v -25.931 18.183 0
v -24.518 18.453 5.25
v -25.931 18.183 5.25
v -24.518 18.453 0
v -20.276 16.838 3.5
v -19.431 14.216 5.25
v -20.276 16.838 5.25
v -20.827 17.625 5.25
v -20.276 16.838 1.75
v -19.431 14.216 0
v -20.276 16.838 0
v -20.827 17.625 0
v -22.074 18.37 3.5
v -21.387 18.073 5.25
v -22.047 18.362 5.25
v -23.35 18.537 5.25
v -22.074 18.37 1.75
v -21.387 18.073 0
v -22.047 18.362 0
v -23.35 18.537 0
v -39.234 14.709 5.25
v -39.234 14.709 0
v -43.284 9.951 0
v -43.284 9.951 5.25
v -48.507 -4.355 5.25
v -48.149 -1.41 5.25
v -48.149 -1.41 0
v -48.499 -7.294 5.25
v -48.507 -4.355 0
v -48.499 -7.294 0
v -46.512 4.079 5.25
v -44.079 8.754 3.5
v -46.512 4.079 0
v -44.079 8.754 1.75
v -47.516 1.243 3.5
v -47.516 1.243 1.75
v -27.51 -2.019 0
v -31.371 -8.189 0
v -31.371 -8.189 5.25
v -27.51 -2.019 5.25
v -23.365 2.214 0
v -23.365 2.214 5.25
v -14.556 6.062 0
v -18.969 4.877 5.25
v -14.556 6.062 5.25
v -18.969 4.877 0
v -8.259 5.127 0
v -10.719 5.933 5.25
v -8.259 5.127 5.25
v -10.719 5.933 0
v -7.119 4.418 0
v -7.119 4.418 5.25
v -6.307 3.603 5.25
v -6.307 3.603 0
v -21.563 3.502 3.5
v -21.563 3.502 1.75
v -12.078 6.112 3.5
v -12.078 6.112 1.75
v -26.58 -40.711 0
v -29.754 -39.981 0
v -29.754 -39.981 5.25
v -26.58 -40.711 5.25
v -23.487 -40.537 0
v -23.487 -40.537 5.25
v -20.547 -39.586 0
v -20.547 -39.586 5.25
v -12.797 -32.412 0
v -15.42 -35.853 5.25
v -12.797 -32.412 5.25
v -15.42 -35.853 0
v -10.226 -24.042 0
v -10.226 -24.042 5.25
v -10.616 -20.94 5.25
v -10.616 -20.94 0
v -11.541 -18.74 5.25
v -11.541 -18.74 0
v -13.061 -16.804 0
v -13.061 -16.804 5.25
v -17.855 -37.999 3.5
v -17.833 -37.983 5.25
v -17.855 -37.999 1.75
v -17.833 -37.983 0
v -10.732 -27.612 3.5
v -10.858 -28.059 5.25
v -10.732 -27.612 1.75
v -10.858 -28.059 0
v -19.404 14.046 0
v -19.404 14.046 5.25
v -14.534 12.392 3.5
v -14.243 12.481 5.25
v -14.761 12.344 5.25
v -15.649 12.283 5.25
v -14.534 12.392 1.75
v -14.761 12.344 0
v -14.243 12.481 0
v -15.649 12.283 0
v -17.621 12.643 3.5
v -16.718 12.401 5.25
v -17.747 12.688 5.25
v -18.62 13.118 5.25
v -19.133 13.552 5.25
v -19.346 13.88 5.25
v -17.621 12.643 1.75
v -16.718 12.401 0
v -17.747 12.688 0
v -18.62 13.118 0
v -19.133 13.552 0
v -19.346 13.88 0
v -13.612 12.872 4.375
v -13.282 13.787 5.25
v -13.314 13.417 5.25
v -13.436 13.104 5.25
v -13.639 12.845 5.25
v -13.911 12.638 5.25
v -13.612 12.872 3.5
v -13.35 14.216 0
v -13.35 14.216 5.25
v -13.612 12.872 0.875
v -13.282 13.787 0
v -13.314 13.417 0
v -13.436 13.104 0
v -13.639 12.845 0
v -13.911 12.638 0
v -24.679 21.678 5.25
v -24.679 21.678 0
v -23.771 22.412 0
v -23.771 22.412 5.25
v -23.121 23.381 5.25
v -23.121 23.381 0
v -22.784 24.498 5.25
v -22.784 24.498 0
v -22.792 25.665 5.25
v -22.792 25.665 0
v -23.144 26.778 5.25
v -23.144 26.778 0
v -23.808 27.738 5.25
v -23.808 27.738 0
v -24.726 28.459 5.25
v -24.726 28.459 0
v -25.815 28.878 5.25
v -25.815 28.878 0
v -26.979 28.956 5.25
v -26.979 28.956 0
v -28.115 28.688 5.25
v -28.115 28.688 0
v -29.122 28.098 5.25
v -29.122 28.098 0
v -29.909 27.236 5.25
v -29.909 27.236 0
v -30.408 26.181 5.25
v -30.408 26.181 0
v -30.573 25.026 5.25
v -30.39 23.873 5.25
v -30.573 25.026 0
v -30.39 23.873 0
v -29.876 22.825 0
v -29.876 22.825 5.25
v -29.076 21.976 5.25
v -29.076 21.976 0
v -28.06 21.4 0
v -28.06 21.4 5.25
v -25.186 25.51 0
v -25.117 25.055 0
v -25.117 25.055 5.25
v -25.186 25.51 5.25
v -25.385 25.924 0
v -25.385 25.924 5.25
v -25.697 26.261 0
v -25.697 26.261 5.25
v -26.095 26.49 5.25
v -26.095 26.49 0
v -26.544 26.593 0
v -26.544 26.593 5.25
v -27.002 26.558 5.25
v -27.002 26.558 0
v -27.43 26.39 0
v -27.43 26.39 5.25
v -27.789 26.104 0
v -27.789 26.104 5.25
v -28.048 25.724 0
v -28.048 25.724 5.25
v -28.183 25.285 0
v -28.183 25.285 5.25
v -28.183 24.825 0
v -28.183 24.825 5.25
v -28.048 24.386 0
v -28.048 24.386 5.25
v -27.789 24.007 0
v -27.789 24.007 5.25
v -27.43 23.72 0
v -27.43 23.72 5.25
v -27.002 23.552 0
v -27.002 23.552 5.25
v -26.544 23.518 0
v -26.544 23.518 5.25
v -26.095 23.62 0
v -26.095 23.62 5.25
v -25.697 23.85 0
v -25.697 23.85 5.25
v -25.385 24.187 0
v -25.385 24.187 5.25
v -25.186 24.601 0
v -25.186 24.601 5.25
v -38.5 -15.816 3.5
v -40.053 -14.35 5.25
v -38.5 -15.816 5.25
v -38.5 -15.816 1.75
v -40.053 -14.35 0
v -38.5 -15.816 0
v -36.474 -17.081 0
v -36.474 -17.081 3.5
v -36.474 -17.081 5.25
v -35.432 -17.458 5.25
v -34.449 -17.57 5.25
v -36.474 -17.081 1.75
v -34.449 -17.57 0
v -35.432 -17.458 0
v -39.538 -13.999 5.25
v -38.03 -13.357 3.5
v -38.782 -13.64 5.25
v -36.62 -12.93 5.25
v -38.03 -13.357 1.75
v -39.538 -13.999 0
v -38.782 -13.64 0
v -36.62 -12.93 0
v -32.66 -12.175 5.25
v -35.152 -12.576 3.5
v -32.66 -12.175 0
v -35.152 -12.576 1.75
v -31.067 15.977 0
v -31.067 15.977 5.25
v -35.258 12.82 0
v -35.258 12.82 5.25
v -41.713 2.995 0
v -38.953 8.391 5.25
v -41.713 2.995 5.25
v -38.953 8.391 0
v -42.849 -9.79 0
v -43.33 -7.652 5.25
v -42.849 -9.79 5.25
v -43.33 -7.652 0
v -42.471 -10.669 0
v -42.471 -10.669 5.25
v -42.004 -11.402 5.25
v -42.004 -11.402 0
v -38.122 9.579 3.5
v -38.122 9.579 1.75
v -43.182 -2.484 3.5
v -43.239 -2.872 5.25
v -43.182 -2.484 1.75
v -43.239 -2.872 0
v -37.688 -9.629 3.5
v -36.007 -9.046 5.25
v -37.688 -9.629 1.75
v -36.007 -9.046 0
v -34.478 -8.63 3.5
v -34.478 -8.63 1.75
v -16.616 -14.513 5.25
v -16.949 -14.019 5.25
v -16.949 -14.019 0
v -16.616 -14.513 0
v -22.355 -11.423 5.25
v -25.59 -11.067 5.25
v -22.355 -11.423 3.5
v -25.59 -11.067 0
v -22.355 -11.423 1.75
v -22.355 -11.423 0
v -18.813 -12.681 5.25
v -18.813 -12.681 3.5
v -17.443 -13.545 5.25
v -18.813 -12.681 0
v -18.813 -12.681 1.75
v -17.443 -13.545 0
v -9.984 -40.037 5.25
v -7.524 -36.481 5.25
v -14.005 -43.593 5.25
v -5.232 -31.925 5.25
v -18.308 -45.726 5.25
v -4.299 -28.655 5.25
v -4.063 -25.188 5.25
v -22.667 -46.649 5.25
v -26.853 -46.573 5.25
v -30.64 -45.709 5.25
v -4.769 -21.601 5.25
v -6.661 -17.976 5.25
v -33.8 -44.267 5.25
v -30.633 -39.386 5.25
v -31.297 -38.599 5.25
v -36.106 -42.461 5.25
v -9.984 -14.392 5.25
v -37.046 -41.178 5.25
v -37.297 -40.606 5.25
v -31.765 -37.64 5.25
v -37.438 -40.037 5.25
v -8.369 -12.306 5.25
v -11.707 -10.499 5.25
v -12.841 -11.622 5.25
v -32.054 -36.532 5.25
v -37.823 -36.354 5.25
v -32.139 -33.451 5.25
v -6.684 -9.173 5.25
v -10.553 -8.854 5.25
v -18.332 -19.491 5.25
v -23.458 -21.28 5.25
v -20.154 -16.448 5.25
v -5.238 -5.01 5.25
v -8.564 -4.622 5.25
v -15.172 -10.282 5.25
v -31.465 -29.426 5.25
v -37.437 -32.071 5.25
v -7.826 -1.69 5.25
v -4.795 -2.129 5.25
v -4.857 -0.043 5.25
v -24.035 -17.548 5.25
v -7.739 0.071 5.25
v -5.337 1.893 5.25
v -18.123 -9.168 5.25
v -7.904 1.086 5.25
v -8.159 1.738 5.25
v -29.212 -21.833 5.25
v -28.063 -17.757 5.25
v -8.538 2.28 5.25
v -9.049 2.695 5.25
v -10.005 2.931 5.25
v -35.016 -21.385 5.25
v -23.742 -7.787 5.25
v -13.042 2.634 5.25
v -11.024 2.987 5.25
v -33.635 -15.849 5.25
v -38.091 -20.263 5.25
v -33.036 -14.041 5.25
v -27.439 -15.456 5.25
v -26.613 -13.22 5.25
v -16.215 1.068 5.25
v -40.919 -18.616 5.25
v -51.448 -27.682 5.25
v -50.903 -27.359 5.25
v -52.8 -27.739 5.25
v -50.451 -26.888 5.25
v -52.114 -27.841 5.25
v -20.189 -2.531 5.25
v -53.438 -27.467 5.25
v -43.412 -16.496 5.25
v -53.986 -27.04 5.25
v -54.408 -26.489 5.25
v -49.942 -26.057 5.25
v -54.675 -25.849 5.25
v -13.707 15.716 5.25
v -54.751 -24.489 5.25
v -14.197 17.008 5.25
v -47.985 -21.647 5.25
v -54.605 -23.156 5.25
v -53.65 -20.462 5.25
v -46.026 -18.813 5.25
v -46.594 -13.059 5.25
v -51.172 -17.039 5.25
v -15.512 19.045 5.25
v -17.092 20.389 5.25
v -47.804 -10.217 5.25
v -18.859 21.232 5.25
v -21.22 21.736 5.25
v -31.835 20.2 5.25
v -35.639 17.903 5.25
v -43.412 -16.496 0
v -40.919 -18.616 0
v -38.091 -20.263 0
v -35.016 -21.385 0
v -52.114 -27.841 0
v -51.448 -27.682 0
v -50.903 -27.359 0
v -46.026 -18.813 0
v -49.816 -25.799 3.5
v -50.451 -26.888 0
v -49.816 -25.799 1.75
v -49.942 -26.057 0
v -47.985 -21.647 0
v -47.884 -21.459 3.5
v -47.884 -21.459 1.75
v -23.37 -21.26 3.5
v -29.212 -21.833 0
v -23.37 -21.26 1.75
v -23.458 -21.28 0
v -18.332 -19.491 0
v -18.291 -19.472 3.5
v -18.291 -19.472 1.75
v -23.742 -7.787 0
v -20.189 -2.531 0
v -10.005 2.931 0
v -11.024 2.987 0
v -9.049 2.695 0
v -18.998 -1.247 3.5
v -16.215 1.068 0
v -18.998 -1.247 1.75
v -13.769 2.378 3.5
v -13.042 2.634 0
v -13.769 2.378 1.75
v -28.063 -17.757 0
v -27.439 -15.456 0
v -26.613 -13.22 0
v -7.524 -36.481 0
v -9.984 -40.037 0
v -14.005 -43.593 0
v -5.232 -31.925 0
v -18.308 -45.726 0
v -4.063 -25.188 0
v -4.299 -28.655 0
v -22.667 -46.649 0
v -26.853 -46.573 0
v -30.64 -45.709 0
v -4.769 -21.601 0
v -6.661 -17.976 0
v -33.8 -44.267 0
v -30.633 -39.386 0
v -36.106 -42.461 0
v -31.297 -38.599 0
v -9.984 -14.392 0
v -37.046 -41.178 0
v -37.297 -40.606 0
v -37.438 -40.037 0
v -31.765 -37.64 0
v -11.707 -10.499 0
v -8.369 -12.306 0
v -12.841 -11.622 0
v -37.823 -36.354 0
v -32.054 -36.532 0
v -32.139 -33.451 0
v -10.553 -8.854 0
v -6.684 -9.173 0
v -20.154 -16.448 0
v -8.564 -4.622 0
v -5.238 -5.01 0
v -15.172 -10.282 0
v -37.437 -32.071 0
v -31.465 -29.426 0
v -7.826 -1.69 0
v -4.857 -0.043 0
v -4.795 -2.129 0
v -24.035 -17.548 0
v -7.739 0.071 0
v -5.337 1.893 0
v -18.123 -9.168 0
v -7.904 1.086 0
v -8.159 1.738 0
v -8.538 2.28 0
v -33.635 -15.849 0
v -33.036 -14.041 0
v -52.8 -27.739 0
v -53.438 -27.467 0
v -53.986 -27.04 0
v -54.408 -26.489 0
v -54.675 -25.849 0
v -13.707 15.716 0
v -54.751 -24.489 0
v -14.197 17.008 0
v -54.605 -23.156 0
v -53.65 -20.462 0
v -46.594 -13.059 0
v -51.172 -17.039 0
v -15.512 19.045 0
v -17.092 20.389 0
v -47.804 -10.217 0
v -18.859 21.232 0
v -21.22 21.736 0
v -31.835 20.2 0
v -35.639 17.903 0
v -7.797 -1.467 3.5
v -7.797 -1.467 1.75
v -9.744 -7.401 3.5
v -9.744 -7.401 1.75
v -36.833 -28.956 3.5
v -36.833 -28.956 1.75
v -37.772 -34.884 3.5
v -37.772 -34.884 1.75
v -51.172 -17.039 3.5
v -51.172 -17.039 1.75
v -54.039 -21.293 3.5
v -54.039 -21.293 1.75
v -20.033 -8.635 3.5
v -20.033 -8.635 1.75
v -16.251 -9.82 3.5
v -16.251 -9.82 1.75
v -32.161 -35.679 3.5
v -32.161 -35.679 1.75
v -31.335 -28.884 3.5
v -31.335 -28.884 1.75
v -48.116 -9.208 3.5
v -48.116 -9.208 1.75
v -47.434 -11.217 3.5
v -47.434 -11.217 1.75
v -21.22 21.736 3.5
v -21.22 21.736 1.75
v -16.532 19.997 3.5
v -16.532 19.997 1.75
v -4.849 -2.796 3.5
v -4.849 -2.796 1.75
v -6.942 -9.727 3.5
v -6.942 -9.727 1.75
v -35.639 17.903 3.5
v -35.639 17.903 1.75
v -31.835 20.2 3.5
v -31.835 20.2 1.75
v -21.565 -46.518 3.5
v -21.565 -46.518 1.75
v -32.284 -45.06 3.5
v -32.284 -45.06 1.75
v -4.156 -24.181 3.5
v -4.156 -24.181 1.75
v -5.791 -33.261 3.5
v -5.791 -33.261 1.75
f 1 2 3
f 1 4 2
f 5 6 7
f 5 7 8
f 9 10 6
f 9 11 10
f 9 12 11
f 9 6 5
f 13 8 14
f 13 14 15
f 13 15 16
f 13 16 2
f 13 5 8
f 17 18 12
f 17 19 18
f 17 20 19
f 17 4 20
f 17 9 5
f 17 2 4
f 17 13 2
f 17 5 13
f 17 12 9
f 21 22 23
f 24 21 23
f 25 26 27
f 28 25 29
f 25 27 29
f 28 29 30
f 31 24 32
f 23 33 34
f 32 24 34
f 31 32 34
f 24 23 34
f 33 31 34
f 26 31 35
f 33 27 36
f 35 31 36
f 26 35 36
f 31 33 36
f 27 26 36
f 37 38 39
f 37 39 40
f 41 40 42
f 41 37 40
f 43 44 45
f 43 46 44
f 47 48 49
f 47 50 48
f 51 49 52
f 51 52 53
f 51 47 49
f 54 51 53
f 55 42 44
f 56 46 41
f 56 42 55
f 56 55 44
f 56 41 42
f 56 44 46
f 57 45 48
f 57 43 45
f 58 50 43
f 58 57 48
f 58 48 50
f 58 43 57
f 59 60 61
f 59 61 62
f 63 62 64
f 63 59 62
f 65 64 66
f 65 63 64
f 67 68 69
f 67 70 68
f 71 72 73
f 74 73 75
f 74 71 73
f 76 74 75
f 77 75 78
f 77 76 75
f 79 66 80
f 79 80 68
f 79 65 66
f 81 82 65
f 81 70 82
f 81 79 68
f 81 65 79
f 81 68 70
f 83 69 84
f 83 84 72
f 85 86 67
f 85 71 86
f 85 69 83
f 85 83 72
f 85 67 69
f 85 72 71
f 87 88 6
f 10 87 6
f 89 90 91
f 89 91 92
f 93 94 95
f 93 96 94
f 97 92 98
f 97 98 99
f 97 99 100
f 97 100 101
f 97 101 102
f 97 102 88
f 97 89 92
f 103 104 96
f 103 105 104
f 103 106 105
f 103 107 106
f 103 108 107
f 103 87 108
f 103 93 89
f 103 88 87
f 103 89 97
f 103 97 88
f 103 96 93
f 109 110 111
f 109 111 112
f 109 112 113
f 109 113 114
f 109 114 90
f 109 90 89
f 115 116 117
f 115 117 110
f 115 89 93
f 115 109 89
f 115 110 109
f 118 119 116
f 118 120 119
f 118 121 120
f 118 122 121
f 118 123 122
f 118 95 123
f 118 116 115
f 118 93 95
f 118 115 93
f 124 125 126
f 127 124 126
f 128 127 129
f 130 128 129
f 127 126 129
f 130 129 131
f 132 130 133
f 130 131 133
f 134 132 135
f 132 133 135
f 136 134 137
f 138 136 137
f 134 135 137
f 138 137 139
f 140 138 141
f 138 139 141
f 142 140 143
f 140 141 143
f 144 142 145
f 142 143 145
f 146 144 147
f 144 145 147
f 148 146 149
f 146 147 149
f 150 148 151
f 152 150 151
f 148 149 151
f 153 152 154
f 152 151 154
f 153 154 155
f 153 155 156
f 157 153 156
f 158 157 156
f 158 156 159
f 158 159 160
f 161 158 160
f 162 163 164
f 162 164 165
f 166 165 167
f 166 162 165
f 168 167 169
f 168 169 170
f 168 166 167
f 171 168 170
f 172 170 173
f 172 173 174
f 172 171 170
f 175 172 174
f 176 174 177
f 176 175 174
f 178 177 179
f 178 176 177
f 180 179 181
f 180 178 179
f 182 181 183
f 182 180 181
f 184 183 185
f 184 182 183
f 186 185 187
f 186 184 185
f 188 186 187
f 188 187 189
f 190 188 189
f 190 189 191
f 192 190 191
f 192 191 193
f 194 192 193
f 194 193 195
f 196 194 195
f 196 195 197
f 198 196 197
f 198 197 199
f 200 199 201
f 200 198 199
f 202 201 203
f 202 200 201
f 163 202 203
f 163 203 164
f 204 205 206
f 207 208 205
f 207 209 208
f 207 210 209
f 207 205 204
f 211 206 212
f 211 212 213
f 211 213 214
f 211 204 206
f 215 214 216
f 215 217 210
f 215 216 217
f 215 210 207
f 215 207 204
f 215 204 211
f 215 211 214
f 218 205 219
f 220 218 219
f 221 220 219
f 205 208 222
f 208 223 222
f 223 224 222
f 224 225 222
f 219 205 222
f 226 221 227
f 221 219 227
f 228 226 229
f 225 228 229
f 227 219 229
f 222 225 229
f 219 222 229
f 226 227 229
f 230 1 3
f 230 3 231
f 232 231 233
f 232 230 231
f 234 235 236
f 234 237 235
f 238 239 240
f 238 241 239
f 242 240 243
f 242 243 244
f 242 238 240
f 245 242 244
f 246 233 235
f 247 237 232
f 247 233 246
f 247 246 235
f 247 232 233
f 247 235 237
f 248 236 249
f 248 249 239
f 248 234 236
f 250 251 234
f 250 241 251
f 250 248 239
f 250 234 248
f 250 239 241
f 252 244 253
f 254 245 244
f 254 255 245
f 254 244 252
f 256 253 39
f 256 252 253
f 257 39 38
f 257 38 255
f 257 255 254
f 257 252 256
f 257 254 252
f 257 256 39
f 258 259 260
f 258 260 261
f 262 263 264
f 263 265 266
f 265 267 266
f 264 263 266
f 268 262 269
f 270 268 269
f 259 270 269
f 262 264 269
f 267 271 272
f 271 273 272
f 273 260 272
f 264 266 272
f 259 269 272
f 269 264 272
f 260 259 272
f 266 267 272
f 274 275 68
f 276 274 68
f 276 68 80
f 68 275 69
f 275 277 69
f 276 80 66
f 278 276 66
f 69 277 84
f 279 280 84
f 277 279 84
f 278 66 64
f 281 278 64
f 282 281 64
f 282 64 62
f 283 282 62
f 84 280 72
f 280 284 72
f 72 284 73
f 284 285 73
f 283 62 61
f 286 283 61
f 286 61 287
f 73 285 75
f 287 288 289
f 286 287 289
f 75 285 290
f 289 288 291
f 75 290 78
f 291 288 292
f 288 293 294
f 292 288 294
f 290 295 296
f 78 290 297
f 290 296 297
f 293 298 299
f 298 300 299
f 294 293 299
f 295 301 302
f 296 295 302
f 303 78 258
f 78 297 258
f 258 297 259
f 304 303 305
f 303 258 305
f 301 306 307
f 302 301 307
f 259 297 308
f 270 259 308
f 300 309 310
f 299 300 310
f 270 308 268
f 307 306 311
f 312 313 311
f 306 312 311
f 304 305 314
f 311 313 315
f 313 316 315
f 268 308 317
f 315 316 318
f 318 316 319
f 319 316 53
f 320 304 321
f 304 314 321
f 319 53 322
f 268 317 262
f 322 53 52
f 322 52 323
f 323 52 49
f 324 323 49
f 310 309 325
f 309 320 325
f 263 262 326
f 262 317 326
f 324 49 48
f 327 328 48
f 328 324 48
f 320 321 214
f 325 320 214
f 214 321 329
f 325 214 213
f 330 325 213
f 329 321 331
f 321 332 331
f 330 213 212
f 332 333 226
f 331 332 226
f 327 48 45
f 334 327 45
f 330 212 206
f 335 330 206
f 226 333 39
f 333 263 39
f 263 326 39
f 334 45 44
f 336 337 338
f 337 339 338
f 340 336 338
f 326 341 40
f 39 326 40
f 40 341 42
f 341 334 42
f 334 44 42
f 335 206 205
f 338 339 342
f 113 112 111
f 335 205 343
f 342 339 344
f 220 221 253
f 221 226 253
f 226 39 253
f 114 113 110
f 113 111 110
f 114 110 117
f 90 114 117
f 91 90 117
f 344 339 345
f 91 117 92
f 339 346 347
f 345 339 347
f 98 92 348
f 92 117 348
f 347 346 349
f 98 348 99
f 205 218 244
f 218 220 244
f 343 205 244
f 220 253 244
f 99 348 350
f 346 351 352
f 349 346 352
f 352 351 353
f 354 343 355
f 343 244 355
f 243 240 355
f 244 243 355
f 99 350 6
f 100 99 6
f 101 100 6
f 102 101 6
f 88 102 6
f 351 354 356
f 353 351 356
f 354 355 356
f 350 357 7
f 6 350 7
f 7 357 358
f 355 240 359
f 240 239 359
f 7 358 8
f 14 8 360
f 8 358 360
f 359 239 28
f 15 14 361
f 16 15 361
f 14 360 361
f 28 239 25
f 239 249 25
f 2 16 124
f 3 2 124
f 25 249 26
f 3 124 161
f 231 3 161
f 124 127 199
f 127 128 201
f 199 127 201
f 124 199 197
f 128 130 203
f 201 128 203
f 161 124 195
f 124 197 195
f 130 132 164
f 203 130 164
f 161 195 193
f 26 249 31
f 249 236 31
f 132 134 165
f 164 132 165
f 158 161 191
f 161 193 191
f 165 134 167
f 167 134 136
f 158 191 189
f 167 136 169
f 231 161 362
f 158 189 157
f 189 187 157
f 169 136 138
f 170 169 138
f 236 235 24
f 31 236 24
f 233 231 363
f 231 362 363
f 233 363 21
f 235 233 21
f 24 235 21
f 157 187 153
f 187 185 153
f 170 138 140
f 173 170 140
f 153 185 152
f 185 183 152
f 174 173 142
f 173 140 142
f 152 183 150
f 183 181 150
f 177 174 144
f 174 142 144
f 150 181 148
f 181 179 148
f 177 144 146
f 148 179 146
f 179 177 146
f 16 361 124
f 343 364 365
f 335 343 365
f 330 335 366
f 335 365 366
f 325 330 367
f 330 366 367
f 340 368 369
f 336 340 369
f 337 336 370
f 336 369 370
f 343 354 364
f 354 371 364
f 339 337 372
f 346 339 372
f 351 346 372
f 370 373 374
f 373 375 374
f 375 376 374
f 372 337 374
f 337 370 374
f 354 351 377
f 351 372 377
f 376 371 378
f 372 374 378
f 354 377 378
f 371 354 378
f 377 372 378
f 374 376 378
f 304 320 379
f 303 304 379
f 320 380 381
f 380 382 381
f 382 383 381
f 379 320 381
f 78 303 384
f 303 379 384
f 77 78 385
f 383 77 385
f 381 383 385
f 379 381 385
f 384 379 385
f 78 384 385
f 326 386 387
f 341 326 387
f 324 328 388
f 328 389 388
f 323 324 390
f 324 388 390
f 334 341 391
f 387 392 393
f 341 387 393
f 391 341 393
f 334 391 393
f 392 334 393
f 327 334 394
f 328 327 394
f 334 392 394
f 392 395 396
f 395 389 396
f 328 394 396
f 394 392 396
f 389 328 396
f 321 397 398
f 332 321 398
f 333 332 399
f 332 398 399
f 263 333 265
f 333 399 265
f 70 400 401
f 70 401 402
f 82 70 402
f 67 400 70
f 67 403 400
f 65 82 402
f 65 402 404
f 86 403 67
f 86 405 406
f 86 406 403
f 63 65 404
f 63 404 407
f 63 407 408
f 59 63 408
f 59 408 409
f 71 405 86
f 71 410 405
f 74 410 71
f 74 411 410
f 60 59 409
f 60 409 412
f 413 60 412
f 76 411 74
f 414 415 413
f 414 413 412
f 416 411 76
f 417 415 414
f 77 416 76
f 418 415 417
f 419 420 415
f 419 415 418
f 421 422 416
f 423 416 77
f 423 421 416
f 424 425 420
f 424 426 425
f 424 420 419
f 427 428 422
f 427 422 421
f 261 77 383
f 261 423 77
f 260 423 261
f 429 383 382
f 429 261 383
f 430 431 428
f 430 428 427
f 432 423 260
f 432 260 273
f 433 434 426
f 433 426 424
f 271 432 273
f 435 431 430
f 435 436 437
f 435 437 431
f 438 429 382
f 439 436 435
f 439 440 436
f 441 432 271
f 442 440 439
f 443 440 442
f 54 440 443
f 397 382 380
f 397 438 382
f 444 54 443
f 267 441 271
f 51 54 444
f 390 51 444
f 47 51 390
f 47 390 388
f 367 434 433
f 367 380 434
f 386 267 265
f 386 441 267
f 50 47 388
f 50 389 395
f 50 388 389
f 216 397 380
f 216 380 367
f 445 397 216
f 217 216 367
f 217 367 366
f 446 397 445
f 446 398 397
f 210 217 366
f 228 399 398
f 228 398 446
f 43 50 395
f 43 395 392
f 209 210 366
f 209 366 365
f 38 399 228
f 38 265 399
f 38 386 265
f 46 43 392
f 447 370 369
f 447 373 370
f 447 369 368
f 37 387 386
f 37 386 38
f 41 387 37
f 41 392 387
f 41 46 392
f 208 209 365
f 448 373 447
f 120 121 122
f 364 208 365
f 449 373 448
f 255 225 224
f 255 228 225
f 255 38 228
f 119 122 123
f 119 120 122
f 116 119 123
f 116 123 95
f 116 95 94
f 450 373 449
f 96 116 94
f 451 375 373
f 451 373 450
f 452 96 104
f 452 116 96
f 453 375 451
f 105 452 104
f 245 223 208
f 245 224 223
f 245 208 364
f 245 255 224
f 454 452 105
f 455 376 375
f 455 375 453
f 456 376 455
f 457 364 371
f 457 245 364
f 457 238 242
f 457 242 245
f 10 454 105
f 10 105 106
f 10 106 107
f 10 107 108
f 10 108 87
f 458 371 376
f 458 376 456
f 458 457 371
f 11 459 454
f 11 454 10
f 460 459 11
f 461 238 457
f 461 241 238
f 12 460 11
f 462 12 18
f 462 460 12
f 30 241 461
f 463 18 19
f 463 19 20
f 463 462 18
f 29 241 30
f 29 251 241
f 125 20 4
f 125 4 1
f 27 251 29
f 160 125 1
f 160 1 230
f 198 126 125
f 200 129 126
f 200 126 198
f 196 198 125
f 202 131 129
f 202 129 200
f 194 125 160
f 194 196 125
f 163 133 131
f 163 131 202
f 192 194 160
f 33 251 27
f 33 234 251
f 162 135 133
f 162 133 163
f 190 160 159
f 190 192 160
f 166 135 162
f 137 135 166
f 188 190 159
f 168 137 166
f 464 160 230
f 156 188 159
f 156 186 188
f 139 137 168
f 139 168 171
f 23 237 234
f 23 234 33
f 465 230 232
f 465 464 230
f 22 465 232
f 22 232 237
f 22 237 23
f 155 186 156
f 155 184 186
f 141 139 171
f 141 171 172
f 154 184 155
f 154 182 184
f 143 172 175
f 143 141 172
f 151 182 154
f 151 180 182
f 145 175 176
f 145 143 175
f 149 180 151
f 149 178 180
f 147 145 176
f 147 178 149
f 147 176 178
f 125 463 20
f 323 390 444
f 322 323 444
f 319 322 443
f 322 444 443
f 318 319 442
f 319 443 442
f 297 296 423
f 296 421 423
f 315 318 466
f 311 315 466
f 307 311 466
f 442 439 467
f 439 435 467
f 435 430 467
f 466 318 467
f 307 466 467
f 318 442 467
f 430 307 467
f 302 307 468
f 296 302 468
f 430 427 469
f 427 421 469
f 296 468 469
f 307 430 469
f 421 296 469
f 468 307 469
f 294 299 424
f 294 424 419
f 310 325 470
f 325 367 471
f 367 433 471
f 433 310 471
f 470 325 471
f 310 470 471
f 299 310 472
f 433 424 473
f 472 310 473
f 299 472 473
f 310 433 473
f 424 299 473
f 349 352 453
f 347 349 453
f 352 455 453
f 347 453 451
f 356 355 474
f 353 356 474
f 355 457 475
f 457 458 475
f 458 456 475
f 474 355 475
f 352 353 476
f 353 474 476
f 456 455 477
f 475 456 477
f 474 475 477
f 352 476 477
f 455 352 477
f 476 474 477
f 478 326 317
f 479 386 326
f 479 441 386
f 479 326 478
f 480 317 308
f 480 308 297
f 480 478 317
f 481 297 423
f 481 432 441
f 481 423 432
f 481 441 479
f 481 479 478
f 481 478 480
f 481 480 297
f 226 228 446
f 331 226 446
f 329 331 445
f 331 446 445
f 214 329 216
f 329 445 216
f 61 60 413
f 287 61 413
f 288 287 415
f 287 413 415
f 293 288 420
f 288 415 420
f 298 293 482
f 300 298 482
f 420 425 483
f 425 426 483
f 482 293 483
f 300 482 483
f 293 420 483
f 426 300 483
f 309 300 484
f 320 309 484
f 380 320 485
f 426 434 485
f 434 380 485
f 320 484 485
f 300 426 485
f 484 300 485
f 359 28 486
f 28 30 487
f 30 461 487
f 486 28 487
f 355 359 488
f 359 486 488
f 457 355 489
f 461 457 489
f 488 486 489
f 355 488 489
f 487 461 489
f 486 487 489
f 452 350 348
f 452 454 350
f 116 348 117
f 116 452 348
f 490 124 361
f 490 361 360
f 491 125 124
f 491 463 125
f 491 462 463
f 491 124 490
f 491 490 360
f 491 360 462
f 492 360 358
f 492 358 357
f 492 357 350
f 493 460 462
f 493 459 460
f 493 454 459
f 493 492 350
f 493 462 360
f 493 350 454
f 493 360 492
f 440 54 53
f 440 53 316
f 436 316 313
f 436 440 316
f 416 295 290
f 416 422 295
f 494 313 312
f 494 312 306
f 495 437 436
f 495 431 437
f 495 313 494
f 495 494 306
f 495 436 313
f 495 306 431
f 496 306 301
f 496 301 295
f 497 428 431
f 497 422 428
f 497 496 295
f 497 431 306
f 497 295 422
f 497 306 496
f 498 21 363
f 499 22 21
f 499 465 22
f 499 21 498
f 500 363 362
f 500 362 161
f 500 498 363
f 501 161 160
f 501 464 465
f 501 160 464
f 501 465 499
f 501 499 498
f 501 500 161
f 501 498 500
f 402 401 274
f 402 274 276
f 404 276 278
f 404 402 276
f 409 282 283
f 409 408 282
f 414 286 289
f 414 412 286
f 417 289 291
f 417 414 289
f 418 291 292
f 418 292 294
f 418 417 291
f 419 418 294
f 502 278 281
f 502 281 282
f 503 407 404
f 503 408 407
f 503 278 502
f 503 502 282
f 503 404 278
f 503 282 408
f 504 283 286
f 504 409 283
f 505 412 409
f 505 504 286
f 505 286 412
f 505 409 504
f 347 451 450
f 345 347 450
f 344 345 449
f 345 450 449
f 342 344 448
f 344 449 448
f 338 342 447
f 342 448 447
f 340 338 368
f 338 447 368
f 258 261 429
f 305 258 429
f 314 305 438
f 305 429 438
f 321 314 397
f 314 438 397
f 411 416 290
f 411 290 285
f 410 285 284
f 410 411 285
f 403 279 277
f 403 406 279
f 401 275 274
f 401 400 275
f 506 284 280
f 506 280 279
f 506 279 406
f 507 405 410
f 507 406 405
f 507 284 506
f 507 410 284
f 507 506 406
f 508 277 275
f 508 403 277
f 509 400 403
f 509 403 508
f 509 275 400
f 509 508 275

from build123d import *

# Parameters (mm, degrees)
F0_R     = 1.541714
F1_DEPTH = 5.25


with BuildPart() as f1:
    # F0 (on Top) → F1 (new body)
    with BuildSketch(Plane.XY):
        with BuildLine():
            add(Edge.make_bspline(
                [(-39.234068, 14.709434), (-35.821676, 18.285589), (-31.741335, 20.813416), (-28.060412, 21.400427)],
                knots=[0, 0, 0, 0, 13.023824, 13.023824, 13.023824, 13.023824], degree=3))
            add(Edge.make_bspline(
                [(-39.234068, 14.709434), (-44.434033, 9.709523), (-49.091313, 1.579042), (-48.498575, -7.294206)],
                knots=[0, 0, 0, 0, 23.87449, 23.87449, 23.87449, 23.87449], degree=3))
            add(Edge.make_bspline(
                [(-48.498575, -7.294206), (-48.312098, -9.073281), (-47.466565, -11.387973), (-46.594005, -13.059257)],
                knots=[0, 0, 0, 0, 6.071506, 6.071506, 6.071506, 6.071506], degree=3))
            add(Edge.make_bspline(
                [(-46.594005, -13.059257), (-51.85584, -16.912187), (-55.326007, -21.131784), (-54.675397, -25.848711)],
                knots=[0, 0, 0, 0, 15.128748, 15.128748, 15.128748, 15.128748], degree=3))
            ThreePointArc((-54.675397, -25.848711), (-53.725936, -27.271081), (-52.113619, -27.841207))
            add(Edge.make_bspline(
                [(-52.113619, -27.841207), (-48.665918, -27.506378), (-50.121121, -21.213111), (-43.411698, -16.496183)],
                knots=[0, 0, 0, 0, 14.298006, 14.298006, 14.298006, 14.298006], degree=3))
            ThreePointArc((-43.411698, -16.496183), (-39.541163, -19.502637), (-35.015989, -21.384818))
            add(Edge.make_bspline(
                [(-35.015989, -21.384818), (-37.141673, -30.065609), (-38.5387, -34.983439), (-37.43797, -40.036903)],
                knots=[0, 0, 0, 0, 18.808675, 18.808675, 18.808675, 18.808675], degree=3))
            add(Edge.make_bspline(
                [(-9.984496, -40.036903), (-20.42749, -51.944654), (-36.633965, -45.385001), (-37.43797, -40.036903)],
                knots=[0, 0, 0, 0, 27.453474, 27.453474, 27.453474, 27.453474], degree=3))
            add(Edge.make_bspline(
                [(-9.984496, -14.392133), (1.210287, -24.002717), (-6.147497, -34.946361), (-9.984496, -40.036903)],
                knots=[0, 0, 0, 0, 25.64477, 25.64477, 25.64477, 25.64477], degree=3))
            add(Edge.make_bspline(
                [(-6.307024, 3.602734), (-2.207622, -1.597791), (-7.333158, -11.79279), (-9.984496, -14.392133)],
                knots=[0, 0, 0, 0, 18.326618, 18.326618, 18.326618, 18.326618], degree=3))
            add(Edge.make_bspline(
                [(-31.371076, -8.189144), (-22.531703, 9.364952), (-9.091812, 7.34916), (-6.307024, 3.602734)],
                knots=[0, 0, 0, 0, 27.699369, 27.699369, 27.699369, 27.699369], degree=3))
            add(Edge.make_bspline(
                [(-42.004138, -11.402097), (-36.800269, -9.169074), (-34.760952, -8.423049), (-31.371076, -8.189144)],
                knots=[0, 0, 0, 0, 11.107884, 11.107884, 11.107884, 11.107884], degree=3))
            add(Edge.make_bspline(
                [(-25.930956, 18.182661), (-41.983377, 13.510846), (-46.004765, -6.258437), (-42.004138, -11.402097)],
                knots=[0, 0, 0, 0, 33.669052, 33.669052, 33.669052, 33.669052], degree=3))
            add(Edge.make_bspline(
                [(-19.430624, 14.216358), (-20.169115, 17.171623), (-20.674834, 19.440178), (-25.930956, 18.182661)],
                knots=[0, 0, 0, 0, 7.614846, 7.614846, 7.614846, 7.614846], degree=3))
            add(Edge.make_bspline(
                [(-13.350238, 14.216358), (-12.521998, 11.102053), (-19.320449, 12.233206), (-19.430624, 14.216358)],
                knots=[0, 0, 0, 0, 6.080386, 6.080386, 6.080386, 6.080386], degree=3))
            add(Edge.make_bspline(
                [(-24.679011, 21.678406), (-22.74786, 21.887188), (-14.866098, 22.765726), (-13.350238, 14.216358)],
                knots=[0, 0, 0, 0, 13.565518, 13.565518, 13.565518, 13.565518], degree=3))
            ThreePointArc((-24.679011, 21.678406), (-26.97945, 28.956423), (-28.060412, 21.400427))
        make_face()
        with BuildLine():
            add(Edge.make_bspline(
                [(-40.052891, -14.35038), (-38.893204, -15.726322), (-36.317203, -17.658971), (-34.448564, -17.57047)],
                knots=[0, 0, 0, 0, 6.463548, 6.463548, 6.463548, 6.463548], degree=3))
            add(Edge.make_bspline(
                [(-40.052891, -14.35038), (-38.873214, -13.307477), (-34.543491, -12.330866), (-32.659906, -12.174509)],
                knots=[0, 0, 0, 0, 7.706532, 7.706532, 7.706532, 7.706532], degree=3))
            ThreePointArc((-32.659906, -12.174509), (-33.308264, -14.954024), (-34.448564, -17.57047))
        make_face(mode=Mode.SUBTRACT)
        with BuildLine():
            add(Edge.make_bspline(
                [(-29.753655, -39.981414), (-34.422584, -37.67078), (-31.337596, -28.266594), (-29.212372, -21.832947)],
                knots=[0, 0, 0, 0, 18.156537, 18.156537, 18.156537, 18.156537], degree=3))
            add(Edge.make_bspline(
                [(-29.212372, -21.832947), (-22.684187, -21.978017), (-18.670561, -19.801956), (-13.061159, -16.803825)],
                knots=[0, 0, 0, 0, 16.91608, 16.91608, 16.91608, 16.91608], degree=3))
            add(Edge.make_bspline(
                [(-29.753655, -39.981414), (-17.026084, -44.860996), (-4.447781, -25.163252), (-13.061159, -16.803825)],
                knots=[0, 0, 0, 0, 28.562913, 28.562913, 28.562913, 28.562913], degree=3))
        make_face(mode=Mode.SUBTRACT)
        with BuildLine():
            ThreePointArc((-16.616, -14.512614), (-22.063718, -17.107114), (-28.06261, -17.756996))
            ThreePointArc((-28.06261, -17.756996), (-27.051078, -14.329094), (-25.590414, -11.067166))
            add(Edge.make_bspline(
                [(-25.590414, -11.067166), (-23.060093, -10.862005), (-17.589131, -12.503293), (-16.616, -14.512614)],
                knots=[0, 0, 0, 0, 9.613076, 9.613076, 9.613076, 9.613076], degree=3))
        make_face(mode=Mode.SUBTRACT)
        with BuildLine():
            add(Edge.make_bspline(
                [(-23.741798, -7.787112), (-20.216195, -8.558338), (-15.917903, -9.419195), (-12.841488, -11.621797)],
                knots=[0, 0, 0, 0, 11.555154, 11.555154, 11.555154, 11.555154], degree=3))
            add(Edge.make_bspline(
                [(-23.741798, -7.787112), (-19.572357, 0.079918), (-13.183153, 4.161766), (-9.049211, 2.69497)],
                knots=[0, 0, 0, 0, 18.04844, 18.04844, 18.04844, 18.04844], degree=3))
            add(Edge.make_bspline(
                [(-9.049211, 2.69497), (-5.512775, 0.57912), (-9.853426, -9.418107), (-12.841488, -11.621797)],
                knots=[0, 0, 0, 0, 14.81051, 14.81051, 14.81051, 14.81051], degree=3))
        make_face(mode=Mode.SUBTRACT)
        with Locations((-26.658739, 25.055223)):
            Circle(F0_R, mode=Mode.SUBTRACT)
    extrude(amount=F1_DEPTH)


solid = f1.part
